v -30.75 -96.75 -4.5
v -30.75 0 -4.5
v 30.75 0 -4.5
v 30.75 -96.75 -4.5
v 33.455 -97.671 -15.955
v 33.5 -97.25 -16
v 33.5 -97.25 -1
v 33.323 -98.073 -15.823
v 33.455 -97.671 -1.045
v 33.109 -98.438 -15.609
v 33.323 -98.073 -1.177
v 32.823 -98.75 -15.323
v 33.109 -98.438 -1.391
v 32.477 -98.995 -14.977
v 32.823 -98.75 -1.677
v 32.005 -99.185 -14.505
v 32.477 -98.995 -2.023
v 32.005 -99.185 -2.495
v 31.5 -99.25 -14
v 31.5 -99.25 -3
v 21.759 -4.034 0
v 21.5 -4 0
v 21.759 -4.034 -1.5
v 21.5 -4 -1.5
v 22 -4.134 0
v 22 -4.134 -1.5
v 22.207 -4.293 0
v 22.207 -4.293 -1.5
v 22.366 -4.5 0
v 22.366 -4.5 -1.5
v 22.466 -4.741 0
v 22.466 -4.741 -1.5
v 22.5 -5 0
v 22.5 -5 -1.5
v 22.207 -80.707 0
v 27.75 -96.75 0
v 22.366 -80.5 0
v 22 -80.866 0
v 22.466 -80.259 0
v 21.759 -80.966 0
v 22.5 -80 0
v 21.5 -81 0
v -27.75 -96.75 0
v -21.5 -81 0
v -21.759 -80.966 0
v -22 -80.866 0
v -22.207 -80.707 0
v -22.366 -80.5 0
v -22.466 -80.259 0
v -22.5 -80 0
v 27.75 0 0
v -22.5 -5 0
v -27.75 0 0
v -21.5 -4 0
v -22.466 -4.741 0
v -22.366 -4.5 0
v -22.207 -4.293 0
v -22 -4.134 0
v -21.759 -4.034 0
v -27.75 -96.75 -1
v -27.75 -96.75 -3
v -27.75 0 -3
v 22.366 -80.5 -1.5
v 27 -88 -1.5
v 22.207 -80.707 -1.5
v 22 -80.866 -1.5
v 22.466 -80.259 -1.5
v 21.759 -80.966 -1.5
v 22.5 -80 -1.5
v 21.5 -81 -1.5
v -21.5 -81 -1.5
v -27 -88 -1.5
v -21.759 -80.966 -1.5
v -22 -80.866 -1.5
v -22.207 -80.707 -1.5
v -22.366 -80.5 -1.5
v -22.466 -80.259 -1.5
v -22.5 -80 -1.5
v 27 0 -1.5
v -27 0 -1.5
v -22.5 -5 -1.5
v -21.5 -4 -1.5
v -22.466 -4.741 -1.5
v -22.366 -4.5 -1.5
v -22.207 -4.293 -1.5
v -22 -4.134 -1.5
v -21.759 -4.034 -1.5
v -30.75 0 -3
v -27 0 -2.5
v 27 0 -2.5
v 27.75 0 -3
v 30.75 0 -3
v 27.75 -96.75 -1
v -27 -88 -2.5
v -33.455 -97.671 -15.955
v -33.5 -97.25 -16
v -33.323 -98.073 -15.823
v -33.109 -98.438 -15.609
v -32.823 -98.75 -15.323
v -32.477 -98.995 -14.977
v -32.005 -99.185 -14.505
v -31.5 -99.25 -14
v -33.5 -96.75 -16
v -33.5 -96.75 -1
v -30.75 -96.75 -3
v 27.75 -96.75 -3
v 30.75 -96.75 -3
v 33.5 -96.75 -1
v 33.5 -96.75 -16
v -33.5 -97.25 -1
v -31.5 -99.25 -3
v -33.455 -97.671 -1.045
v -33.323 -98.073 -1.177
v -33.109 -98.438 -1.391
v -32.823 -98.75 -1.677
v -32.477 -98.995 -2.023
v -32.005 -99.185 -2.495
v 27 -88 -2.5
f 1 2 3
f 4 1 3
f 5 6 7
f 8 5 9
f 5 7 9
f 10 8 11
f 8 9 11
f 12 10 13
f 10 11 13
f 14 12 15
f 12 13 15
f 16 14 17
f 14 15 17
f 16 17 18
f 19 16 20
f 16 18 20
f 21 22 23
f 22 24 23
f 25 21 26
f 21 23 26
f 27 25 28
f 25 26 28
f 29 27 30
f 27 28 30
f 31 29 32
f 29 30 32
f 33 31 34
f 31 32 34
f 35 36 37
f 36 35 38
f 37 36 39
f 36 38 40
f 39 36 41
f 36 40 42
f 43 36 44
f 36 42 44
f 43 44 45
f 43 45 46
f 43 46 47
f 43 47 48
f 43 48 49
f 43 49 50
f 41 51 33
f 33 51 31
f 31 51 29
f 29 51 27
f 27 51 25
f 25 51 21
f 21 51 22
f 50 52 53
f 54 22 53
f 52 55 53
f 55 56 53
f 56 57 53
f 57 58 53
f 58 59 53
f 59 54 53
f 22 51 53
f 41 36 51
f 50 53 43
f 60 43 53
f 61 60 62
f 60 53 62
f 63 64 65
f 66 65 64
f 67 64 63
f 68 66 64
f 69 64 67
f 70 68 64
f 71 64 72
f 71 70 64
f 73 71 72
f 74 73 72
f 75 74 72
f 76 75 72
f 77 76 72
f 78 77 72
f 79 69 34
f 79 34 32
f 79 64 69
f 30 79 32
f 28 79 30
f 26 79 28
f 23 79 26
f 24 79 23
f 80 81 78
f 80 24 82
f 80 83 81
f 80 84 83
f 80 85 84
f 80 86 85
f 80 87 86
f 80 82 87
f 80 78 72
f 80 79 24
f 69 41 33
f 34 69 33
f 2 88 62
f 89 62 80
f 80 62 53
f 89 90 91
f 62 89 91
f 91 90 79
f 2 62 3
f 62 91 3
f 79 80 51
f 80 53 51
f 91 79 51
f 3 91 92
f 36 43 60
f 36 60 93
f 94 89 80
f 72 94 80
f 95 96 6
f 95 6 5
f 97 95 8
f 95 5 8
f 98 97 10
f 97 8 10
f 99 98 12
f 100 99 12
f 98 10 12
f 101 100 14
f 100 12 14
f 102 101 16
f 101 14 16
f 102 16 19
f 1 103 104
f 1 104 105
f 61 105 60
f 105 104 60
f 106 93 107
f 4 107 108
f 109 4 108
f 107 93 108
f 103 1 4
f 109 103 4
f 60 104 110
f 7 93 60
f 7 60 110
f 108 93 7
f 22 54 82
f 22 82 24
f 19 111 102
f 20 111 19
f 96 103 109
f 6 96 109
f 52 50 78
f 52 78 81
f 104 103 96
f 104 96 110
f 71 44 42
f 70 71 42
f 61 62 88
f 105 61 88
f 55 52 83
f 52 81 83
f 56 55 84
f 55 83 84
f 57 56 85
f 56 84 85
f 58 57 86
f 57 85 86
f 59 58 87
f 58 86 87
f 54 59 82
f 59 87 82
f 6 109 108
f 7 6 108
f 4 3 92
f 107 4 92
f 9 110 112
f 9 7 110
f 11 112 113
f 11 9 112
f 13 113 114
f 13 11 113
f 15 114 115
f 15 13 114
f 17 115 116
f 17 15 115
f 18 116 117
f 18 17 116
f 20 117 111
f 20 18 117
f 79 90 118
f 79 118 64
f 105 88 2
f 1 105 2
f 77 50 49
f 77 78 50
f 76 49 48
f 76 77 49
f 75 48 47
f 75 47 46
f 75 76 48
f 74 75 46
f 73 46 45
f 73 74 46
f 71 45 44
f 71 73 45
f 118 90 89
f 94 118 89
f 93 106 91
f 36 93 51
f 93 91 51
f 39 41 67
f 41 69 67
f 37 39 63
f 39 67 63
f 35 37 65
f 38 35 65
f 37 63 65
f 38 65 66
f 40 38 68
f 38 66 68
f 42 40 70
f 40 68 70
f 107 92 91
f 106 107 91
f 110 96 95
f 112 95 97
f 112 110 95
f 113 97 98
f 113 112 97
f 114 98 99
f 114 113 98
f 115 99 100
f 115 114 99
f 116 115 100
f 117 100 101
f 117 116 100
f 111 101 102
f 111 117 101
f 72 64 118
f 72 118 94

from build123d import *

# Parameters (mm, degrees)
F1_DEPTH = 96.75
F2_W     = 67
F2_H     = 15
F3_DEPTH = 2.5
F4_W     = 54
F4_H     = 1
F5_DEPTH = 88
F6_W     = 45
F6_H     = 77
F7_DEPTH = 1.5
F8_R     = 1
F9_R     = 2


with BuildPart() as f1:
    # F0 (on Front) → F1 (new body)
    with BuildSketch(Plane.XZ):
        Polygon((-27.75, 0), (-27.75, -3), (-30.75, -3), (-30.75, -4.5), (30.75, -4.5), (30.75, -3), (27.75, -3), (27.75, 0), align=None)
    extrude(amount=F1_DEPTH)

    # F2 (on face) → F3 (join)
    with BuildSketch(Plane.XZ.offset(96.75)):
        with Locations((0, -8.5)):
            Rectangle(F2_W, F2_H)
    extrude(amount=F3_DEPTH)

    # F4 (on face) → F5 (cut)
    with BuildSketch(Plane(origin=(0, 0, 0), x_dir=(-1, 0, 0), z_dir=(0, 1, 0))):
        with Locations((0, -2)):
            Rectangle(F4_W, F4_H)
    extrude(amount=-F5_DEPTH, mode=Mode.SUBTRACT)

    # F6 (on face) → F7 (cut, through all)
    with BuildSketch(Plane.XY):
        with Locations((0, -42.5)):
            Rectangle(F6_W, F6_H)
    extrude(amount=-F7_DEPTH, mode=Mode.SUBTRACT)

    # F8
    f8_edges = [f1.edges().sort_by_distance(p)[0] for p in [
        (-22.5, -81, -0.75),
        (-22.5, -4, -0.75),
        (22.5, -4, -0.75),
        (22.5, -81, -0.75),
    ]]
    fillet(f8_edges, radius=F8_R)

    # F9
    f9_edges = [f1.edges().sort_by_distance(p)[0] for p in [
        (0, -99.25, -16),
        (0, -99.25, -1),
        (33.5, -99.25, -8.5),
        (-33.5, -99.25, -8.5),
    ]]
    fillet(f9_edges, radius=F9_R)


solid = f1.part
